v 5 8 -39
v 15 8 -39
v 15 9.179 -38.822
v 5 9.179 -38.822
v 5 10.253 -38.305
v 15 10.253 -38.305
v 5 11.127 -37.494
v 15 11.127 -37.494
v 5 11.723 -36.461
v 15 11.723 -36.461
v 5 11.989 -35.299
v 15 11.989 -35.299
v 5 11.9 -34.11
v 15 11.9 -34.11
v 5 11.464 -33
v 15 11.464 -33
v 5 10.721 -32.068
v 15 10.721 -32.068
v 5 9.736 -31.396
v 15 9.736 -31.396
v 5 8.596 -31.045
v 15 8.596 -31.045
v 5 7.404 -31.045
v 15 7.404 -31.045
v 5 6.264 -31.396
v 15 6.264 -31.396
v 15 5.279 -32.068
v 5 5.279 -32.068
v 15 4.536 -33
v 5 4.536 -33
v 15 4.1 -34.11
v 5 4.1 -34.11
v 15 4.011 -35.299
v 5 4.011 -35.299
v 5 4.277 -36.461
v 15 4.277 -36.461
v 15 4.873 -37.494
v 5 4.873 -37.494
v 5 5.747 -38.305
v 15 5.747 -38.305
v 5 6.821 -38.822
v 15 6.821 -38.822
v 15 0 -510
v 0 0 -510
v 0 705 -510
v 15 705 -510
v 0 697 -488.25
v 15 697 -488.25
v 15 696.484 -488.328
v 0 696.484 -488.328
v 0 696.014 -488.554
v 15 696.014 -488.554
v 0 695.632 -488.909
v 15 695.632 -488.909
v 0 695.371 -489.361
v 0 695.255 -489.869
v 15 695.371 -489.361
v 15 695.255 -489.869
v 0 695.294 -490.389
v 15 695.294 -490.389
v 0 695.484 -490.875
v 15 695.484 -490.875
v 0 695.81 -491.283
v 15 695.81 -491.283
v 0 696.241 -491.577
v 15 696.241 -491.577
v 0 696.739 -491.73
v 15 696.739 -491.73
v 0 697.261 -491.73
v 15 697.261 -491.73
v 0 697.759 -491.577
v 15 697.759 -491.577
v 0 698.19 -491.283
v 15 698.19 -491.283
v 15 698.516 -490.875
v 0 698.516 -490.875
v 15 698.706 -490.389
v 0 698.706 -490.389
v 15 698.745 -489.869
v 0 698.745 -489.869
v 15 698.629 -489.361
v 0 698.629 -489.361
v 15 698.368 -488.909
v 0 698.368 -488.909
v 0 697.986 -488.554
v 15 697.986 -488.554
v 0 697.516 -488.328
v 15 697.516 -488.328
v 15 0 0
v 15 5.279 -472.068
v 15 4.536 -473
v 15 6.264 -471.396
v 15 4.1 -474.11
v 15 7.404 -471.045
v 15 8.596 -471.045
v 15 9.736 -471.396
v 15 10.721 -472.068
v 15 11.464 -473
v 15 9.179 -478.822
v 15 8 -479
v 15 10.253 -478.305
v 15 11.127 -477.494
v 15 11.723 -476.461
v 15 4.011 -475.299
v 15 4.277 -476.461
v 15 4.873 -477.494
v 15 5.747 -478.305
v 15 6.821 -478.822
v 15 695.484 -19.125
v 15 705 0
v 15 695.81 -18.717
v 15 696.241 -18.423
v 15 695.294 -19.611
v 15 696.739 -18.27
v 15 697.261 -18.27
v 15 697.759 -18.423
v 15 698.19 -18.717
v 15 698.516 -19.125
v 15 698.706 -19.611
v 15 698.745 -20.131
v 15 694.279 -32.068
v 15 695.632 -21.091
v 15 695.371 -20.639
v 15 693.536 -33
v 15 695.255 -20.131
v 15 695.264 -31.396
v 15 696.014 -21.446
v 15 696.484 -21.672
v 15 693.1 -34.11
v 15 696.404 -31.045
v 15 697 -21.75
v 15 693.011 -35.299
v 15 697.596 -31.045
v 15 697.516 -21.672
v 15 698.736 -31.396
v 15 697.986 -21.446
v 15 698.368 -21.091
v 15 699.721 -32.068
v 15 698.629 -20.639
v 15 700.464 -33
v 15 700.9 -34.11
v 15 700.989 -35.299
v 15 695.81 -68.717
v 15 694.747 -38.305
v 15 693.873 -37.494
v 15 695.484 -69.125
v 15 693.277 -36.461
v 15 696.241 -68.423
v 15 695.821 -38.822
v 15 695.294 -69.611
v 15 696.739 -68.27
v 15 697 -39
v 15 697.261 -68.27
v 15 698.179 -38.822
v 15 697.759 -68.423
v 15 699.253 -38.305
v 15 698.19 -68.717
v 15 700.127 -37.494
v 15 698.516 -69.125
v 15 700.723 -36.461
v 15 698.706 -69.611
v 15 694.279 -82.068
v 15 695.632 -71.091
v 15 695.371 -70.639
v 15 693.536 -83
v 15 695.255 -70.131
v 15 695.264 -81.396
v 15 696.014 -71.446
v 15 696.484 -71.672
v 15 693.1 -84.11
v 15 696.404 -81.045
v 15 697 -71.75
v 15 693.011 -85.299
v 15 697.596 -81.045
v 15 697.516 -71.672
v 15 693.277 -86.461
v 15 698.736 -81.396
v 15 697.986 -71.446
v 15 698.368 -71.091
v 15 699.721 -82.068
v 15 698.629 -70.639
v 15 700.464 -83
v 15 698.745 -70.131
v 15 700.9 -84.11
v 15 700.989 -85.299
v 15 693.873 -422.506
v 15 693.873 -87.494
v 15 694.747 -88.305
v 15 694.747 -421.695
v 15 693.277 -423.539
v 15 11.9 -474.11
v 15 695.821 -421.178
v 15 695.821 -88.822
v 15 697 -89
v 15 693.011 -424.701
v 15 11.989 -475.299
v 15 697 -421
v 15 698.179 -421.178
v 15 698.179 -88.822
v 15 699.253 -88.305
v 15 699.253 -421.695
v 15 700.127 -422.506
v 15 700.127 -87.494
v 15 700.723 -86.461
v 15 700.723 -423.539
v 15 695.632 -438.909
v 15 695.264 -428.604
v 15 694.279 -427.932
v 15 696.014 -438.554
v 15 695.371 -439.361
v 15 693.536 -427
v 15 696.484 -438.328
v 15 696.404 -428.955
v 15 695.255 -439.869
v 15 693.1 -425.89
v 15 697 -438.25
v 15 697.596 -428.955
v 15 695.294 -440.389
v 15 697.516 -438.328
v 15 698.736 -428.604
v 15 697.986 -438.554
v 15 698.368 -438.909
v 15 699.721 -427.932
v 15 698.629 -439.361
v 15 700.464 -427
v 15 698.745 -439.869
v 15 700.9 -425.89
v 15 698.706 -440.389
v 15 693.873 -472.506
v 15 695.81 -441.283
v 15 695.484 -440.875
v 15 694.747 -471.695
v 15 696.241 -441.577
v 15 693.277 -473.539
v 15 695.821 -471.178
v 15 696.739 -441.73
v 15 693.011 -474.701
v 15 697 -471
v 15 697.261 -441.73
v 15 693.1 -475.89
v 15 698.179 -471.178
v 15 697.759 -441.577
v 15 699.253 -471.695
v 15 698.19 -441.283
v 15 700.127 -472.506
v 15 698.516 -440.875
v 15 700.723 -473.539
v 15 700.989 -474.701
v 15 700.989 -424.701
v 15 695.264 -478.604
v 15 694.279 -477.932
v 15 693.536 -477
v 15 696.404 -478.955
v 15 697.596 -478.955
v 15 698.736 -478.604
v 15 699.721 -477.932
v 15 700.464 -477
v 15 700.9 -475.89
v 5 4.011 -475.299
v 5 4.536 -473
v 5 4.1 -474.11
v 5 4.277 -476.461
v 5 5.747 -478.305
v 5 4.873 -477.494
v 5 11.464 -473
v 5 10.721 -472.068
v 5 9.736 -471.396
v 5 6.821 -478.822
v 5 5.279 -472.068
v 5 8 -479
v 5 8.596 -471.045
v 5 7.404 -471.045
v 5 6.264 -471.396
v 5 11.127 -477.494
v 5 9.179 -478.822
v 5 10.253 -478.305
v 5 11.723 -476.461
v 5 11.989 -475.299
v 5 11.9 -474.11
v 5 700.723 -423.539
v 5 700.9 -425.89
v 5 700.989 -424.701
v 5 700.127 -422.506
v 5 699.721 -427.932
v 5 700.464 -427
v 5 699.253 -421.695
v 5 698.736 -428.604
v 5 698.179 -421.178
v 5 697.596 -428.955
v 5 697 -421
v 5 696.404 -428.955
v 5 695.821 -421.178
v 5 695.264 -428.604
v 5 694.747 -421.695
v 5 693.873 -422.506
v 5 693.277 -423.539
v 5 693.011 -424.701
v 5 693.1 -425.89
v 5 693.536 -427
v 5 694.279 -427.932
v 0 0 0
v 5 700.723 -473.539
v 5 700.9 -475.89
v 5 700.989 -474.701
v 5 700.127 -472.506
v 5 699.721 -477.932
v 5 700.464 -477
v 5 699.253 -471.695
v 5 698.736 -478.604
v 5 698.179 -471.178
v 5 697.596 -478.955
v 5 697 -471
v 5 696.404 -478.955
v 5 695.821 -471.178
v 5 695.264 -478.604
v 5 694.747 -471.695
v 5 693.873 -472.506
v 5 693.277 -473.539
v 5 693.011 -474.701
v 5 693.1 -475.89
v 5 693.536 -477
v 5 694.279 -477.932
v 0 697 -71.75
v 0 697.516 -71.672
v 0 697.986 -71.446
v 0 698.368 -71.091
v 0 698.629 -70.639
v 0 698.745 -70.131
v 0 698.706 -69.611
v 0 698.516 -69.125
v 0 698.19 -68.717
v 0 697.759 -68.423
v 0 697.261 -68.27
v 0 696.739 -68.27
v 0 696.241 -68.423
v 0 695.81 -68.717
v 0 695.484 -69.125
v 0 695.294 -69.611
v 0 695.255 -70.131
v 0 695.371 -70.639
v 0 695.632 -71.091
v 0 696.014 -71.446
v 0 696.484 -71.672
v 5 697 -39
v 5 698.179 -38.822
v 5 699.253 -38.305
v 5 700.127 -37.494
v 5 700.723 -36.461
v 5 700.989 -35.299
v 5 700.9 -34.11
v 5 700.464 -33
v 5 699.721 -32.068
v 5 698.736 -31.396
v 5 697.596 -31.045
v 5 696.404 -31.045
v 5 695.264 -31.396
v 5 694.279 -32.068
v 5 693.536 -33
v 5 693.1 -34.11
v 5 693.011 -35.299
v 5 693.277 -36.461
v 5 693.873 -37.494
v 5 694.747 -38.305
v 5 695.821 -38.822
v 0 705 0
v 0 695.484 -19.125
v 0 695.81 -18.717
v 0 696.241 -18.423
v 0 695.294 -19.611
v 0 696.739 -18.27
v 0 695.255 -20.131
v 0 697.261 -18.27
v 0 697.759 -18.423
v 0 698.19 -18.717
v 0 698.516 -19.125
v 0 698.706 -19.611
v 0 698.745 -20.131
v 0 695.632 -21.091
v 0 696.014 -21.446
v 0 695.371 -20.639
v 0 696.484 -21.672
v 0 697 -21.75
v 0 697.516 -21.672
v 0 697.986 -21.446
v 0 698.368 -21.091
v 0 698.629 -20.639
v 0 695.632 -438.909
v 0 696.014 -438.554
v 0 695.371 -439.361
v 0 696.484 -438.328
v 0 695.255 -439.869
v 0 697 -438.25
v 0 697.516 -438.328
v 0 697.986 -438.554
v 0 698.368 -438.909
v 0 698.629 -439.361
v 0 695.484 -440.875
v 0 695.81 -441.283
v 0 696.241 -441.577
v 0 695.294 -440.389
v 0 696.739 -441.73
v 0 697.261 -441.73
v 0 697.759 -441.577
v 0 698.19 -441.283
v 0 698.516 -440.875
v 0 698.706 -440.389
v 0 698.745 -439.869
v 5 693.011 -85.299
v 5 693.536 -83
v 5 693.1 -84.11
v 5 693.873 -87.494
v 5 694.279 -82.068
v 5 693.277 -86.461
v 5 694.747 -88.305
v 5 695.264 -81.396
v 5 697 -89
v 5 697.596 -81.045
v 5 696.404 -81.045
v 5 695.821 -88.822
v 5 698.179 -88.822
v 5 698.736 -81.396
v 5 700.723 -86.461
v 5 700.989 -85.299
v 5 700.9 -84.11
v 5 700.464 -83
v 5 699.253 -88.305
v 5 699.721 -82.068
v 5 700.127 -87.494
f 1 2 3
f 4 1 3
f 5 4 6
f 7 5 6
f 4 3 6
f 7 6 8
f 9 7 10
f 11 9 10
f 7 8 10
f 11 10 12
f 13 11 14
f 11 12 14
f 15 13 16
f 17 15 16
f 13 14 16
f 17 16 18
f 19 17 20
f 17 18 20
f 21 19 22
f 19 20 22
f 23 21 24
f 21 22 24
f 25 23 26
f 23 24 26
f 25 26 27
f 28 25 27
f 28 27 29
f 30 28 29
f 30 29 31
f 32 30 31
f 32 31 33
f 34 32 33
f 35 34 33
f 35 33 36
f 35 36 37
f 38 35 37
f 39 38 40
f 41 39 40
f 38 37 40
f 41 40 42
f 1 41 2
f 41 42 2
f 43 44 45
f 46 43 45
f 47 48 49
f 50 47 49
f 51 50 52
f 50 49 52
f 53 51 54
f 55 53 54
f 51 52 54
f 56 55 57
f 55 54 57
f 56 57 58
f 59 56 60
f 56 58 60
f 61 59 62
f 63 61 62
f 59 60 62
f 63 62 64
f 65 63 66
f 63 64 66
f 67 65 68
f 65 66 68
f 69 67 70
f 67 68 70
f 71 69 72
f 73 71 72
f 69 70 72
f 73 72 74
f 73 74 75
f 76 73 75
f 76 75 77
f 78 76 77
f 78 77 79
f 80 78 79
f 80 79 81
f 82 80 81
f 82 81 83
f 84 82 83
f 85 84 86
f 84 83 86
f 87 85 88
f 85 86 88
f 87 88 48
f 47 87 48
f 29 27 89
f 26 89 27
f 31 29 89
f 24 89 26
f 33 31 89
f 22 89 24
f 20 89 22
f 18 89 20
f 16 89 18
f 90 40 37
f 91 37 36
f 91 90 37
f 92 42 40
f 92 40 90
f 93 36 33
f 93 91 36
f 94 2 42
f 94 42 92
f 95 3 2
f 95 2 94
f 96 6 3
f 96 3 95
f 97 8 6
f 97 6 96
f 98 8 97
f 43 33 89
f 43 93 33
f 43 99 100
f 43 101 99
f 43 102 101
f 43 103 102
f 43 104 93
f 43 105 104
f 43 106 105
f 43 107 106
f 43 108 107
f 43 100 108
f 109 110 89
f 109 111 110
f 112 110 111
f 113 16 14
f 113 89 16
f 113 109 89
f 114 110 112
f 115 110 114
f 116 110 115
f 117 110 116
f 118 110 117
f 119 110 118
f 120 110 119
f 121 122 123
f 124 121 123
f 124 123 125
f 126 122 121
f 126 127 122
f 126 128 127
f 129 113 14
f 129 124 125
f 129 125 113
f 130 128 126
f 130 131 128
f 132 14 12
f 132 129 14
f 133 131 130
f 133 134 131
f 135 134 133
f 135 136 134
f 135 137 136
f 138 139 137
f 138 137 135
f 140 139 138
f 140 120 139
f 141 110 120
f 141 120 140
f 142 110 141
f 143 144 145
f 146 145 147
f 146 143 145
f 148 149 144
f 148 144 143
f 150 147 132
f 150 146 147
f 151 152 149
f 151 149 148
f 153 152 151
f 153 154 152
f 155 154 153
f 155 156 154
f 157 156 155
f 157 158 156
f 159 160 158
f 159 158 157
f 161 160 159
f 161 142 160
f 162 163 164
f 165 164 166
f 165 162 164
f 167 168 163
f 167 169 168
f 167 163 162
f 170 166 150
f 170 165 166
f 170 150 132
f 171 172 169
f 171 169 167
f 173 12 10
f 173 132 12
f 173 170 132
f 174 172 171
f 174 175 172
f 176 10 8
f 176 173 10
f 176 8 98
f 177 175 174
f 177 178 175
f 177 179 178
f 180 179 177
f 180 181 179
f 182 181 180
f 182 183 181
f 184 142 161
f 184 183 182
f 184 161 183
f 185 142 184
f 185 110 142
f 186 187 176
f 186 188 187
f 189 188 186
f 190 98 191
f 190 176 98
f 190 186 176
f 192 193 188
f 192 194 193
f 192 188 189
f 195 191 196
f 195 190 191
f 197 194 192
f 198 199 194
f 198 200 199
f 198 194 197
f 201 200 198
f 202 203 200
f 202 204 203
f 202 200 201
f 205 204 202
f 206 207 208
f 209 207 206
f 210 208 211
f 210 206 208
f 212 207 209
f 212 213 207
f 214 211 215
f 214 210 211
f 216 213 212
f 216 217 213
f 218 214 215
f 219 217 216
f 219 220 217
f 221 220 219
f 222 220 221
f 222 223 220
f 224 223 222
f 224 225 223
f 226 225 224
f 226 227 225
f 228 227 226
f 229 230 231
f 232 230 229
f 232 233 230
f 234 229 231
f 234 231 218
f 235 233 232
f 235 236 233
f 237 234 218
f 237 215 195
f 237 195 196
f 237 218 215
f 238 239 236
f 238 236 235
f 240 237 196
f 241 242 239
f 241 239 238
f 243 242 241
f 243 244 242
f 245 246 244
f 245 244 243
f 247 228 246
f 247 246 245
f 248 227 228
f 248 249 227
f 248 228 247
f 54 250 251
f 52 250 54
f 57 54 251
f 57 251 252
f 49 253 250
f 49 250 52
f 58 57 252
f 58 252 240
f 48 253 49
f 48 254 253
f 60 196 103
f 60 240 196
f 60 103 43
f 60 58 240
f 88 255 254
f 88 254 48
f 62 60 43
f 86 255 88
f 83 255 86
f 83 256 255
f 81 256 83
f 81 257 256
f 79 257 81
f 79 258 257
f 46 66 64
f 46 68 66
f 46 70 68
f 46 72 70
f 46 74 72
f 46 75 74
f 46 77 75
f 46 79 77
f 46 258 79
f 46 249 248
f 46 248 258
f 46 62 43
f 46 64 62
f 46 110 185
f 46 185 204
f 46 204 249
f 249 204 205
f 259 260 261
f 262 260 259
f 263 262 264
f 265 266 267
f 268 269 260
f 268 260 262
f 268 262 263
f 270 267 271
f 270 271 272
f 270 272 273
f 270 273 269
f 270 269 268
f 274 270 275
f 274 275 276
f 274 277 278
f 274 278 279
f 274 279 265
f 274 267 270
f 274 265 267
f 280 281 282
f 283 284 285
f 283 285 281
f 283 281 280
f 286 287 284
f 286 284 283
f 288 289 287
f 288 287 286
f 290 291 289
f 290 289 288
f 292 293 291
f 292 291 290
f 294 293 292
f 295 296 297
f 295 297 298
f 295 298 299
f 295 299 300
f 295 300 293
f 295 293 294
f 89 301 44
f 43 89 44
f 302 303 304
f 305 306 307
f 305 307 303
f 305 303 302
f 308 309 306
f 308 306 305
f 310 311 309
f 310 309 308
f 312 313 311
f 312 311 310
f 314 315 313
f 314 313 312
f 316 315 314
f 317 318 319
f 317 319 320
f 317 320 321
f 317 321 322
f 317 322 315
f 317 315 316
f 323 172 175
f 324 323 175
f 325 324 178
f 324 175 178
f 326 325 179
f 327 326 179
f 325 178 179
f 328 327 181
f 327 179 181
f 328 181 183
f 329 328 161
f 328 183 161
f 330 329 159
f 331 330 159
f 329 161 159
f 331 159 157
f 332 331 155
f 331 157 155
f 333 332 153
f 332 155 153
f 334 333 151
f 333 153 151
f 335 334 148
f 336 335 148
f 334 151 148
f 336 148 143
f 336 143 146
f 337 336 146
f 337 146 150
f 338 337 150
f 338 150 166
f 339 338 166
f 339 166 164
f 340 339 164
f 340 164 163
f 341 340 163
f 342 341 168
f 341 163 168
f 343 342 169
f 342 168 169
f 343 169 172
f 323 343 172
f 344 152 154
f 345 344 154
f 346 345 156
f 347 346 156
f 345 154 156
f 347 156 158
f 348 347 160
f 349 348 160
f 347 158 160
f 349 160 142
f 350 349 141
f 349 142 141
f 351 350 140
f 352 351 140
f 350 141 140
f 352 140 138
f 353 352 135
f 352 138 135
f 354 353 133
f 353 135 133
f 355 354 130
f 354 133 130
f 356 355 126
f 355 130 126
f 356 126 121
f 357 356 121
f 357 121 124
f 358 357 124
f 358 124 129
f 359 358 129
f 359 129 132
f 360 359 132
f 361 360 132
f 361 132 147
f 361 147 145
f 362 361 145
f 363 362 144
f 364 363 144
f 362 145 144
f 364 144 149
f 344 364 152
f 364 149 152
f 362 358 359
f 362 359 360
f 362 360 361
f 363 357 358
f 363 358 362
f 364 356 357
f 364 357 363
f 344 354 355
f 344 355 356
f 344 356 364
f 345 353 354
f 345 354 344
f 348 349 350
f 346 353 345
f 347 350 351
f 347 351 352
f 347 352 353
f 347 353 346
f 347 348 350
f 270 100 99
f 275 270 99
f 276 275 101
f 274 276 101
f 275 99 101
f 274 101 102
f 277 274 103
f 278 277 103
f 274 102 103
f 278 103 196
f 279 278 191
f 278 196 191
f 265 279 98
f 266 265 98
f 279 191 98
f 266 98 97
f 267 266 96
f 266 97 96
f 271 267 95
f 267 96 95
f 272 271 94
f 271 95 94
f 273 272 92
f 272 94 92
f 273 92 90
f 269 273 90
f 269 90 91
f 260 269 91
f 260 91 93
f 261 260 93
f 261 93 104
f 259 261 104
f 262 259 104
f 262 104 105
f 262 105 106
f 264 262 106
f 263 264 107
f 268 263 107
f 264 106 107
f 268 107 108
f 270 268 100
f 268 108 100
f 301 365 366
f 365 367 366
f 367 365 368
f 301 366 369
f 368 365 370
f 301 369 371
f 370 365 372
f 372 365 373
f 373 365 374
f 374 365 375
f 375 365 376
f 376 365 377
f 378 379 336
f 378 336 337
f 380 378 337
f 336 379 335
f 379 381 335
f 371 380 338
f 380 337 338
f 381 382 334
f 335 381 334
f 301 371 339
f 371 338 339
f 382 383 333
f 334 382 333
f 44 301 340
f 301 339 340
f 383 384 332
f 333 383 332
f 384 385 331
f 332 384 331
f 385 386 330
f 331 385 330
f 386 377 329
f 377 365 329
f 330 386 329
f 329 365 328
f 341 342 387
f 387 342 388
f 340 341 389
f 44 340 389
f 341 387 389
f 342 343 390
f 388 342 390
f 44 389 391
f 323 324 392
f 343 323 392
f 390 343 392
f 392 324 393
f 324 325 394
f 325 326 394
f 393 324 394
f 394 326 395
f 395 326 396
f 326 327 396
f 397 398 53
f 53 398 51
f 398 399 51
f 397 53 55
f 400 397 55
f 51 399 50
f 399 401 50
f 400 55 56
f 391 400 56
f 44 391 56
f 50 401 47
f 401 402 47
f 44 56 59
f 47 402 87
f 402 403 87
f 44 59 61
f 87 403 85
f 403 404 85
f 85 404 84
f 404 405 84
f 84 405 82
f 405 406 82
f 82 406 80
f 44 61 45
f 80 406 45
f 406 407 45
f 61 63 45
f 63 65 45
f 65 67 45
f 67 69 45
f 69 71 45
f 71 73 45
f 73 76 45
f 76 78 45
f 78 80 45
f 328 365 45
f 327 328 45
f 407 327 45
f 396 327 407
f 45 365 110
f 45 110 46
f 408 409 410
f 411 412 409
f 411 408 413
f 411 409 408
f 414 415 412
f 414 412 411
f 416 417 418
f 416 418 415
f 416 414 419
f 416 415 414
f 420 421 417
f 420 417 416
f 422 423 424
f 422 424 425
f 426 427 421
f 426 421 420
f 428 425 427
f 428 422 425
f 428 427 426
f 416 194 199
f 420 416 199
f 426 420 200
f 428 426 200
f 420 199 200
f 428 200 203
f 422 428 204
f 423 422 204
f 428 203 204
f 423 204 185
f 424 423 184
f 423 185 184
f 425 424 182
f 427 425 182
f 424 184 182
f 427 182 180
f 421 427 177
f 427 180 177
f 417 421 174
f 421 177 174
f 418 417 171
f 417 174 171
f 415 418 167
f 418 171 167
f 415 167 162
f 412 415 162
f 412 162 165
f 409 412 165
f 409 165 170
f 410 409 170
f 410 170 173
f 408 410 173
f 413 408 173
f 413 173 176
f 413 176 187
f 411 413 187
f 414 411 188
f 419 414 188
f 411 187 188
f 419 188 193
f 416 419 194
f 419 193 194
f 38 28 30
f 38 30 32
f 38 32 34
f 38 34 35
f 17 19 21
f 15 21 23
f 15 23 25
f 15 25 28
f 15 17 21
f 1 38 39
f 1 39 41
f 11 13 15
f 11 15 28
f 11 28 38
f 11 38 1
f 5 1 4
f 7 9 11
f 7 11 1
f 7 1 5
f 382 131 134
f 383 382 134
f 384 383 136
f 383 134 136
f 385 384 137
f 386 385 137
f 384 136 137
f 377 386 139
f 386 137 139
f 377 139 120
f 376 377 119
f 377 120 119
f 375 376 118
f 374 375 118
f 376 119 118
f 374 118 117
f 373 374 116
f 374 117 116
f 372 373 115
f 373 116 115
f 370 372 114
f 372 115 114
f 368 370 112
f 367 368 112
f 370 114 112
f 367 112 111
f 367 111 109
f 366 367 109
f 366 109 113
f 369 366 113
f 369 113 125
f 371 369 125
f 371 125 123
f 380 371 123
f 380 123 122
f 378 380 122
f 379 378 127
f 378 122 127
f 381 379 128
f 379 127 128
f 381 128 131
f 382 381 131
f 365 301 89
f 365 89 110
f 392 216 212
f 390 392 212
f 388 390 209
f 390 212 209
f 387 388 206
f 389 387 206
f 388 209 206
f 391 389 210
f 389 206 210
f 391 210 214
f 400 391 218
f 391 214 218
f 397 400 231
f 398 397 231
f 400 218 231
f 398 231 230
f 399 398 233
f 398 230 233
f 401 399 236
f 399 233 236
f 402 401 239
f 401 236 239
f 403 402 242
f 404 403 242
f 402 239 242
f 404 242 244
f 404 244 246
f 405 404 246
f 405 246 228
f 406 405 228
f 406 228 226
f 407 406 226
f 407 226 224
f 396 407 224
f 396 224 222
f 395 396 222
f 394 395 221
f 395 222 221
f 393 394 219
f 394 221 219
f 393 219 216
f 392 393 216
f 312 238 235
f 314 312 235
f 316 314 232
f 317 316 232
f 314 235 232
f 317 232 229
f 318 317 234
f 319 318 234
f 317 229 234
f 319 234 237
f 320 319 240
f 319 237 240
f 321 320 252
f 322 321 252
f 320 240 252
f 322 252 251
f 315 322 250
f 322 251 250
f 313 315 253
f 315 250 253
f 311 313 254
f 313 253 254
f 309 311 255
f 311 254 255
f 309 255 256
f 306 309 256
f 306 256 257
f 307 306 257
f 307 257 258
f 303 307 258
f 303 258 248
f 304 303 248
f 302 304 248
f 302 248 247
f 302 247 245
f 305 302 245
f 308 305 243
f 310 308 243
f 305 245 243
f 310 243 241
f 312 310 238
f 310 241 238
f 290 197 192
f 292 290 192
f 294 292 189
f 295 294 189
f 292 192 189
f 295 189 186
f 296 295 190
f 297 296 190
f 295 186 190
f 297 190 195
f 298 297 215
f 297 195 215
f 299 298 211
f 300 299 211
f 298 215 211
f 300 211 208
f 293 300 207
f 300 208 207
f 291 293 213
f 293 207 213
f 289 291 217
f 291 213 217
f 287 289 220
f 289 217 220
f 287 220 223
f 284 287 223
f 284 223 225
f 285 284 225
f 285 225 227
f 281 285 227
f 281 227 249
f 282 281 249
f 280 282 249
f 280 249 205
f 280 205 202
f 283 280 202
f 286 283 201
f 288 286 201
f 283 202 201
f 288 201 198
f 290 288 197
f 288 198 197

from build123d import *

# Parameters (mm, degrees)
SKETCH_1_W          = 510
SKETCH_1_H          = 705
EXTRUDE_1_DEPTH     = 15
SKETCH_257_R        = 4
CUT_EXTRUDE_3_DEPTH = 10
SKETCH_750_R        = 1.75
CUT_EXTRUDE_4_DEPTH = 15


with BuildPart() as part:
    # Эскиз1 → Вытянуть1 (new body)
    with BuildSketch(Plane(origin=(0, 0, 0), x_dir=(0, 0, -1), z_dir=(1, 0, 0))):
        with Locations((255, 352.5)):
            Rectangle(SKETCH_1_W, SKETCH_1_H)
    extrude(amount=EXTRUDE_1_DEPTH)

    # Sketch 257 → Вырез-Вытянуть3 (cut)
    with BuildSketch(Plane(origin=(15, 0, 0), x_dir=(0, 0, -1), z_dir=(1, 0, 0))):
        with Locations(Location((425, 697, 0), (0, 0, 180))):  # turned: the seam where the file's is
            Circle(SKETCH_257_R)
        with Locations(Location((475, 697, 0), (0, 0, 180))):  # turned: the seam where the file's is
            Circle(SKETCH_257_R)
        with Locations((35, 697)):
            Circle(SKETCH_257_R)
        with Locations((85, 697)):
            Circle(SKETCH_257_R)
        with Locations((35, 8)):
            Circle(SKETCH_257_R)
        with Locations((475, 8)):
            Circle(SKETCH_257_R)
    extrude(amount=-CUT_EXTRUDE_3_DEPTH, mode=Mode.SUBTRACT)

    # Sketch 750 → Вырез-Вытянуть4 (cut)
    with BuildSketch(Plane(origin=(15, 0, 0), x_dir=(0, 0, -1), z_dir=(1, 0, 0))):
        with Locations(Location((440, 697, 0), (0, 0, 180))):  # turned: the seam where the file's is
            Circle(SKETCH_750_R)
        with Locations(Location((490, 697, 0), (0, 0, 180))):  # turned: the seam where the file's is
            Circle(SKETCH_750_R)
        with Locations((20, 697)):
            Circle(SKETCH_750_R)
        with Locations((70, 697)):
            Circle(SKETCH_750_R)
    extrude(amount=-CUT_EXTRUDE_4_DEPTH, mode=Mode.SUBTRACT)


solid = part.part
